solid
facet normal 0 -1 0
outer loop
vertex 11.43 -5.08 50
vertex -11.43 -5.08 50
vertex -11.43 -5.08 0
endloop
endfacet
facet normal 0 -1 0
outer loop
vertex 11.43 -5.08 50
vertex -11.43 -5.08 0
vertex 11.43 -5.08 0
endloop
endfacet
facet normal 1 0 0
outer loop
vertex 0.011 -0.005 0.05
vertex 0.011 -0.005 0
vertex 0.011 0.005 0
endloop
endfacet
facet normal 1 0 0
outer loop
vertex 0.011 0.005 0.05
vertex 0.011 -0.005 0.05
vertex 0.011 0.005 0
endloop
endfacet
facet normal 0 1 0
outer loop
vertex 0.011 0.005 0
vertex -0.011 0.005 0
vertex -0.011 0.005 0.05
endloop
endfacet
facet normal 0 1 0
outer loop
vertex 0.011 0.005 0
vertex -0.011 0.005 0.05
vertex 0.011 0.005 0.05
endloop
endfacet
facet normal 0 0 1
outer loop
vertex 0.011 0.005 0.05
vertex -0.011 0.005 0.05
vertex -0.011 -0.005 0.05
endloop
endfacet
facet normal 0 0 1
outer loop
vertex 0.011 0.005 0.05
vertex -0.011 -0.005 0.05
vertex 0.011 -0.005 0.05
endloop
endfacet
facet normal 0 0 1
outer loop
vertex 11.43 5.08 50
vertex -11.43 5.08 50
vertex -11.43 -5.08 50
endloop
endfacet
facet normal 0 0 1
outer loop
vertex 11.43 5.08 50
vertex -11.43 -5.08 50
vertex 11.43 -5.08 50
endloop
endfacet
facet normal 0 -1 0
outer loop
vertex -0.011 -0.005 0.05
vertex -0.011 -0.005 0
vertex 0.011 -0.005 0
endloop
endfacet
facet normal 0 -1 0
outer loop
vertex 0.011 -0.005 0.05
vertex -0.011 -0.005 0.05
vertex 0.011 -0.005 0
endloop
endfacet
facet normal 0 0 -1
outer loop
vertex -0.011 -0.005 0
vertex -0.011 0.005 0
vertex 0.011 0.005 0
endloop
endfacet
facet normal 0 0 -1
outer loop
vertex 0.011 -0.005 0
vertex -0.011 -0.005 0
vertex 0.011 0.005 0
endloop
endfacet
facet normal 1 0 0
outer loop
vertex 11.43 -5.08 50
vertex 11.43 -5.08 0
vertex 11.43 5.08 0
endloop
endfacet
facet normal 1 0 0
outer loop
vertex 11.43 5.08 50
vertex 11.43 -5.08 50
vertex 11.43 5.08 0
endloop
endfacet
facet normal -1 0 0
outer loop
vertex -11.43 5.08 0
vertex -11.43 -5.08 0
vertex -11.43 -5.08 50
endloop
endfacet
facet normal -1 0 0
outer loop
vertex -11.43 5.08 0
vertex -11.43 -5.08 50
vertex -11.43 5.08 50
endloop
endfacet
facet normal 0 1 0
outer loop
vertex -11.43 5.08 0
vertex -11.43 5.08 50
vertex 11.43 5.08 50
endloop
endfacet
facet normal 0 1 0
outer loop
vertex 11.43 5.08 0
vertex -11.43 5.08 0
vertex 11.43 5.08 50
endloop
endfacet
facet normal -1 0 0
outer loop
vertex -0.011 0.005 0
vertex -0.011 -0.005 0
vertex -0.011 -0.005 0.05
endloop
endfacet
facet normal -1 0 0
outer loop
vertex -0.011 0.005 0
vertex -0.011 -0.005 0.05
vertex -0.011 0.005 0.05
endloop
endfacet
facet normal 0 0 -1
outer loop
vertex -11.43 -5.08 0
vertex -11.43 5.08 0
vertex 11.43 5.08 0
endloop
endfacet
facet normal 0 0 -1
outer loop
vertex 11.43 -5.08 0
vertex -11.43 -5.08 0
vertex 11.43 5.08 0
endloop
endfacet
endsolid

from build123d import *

# Parameters (mm, degrees)
RECTANGLE_W       = 22.86
RECTANGLE_H       = 10.16
EXTRUDE_DEPTH     = 50
CLONE_SCALE_SCALE = 0.001


with BuildPart() as extrude_body:
    # Rectangle → Extrude (new body)
    with BuildSketch(Plane(origin=(-11.43, -5.08, 0), x_dir=(1, 0, 0), z_dir=(0, 0, 1))):
        with Locations((11.43, 5.08)):
            Rectangle(RECTANGLE_W, RECTANGLE_H)
    extrude(amount=EXTRUDE_DEPTH)


with BuildPart() as extrude001:
    # Clone base: copy of Extrude body
    add(extrude_body.part)


with BuildPart() as extrude001_1:
    # Clone scale: moved
    add(extrude001.part.scale(CLONE_SCALE_SCALE))


solid = Compound([extrude_body.part, extrude001_1.part])
